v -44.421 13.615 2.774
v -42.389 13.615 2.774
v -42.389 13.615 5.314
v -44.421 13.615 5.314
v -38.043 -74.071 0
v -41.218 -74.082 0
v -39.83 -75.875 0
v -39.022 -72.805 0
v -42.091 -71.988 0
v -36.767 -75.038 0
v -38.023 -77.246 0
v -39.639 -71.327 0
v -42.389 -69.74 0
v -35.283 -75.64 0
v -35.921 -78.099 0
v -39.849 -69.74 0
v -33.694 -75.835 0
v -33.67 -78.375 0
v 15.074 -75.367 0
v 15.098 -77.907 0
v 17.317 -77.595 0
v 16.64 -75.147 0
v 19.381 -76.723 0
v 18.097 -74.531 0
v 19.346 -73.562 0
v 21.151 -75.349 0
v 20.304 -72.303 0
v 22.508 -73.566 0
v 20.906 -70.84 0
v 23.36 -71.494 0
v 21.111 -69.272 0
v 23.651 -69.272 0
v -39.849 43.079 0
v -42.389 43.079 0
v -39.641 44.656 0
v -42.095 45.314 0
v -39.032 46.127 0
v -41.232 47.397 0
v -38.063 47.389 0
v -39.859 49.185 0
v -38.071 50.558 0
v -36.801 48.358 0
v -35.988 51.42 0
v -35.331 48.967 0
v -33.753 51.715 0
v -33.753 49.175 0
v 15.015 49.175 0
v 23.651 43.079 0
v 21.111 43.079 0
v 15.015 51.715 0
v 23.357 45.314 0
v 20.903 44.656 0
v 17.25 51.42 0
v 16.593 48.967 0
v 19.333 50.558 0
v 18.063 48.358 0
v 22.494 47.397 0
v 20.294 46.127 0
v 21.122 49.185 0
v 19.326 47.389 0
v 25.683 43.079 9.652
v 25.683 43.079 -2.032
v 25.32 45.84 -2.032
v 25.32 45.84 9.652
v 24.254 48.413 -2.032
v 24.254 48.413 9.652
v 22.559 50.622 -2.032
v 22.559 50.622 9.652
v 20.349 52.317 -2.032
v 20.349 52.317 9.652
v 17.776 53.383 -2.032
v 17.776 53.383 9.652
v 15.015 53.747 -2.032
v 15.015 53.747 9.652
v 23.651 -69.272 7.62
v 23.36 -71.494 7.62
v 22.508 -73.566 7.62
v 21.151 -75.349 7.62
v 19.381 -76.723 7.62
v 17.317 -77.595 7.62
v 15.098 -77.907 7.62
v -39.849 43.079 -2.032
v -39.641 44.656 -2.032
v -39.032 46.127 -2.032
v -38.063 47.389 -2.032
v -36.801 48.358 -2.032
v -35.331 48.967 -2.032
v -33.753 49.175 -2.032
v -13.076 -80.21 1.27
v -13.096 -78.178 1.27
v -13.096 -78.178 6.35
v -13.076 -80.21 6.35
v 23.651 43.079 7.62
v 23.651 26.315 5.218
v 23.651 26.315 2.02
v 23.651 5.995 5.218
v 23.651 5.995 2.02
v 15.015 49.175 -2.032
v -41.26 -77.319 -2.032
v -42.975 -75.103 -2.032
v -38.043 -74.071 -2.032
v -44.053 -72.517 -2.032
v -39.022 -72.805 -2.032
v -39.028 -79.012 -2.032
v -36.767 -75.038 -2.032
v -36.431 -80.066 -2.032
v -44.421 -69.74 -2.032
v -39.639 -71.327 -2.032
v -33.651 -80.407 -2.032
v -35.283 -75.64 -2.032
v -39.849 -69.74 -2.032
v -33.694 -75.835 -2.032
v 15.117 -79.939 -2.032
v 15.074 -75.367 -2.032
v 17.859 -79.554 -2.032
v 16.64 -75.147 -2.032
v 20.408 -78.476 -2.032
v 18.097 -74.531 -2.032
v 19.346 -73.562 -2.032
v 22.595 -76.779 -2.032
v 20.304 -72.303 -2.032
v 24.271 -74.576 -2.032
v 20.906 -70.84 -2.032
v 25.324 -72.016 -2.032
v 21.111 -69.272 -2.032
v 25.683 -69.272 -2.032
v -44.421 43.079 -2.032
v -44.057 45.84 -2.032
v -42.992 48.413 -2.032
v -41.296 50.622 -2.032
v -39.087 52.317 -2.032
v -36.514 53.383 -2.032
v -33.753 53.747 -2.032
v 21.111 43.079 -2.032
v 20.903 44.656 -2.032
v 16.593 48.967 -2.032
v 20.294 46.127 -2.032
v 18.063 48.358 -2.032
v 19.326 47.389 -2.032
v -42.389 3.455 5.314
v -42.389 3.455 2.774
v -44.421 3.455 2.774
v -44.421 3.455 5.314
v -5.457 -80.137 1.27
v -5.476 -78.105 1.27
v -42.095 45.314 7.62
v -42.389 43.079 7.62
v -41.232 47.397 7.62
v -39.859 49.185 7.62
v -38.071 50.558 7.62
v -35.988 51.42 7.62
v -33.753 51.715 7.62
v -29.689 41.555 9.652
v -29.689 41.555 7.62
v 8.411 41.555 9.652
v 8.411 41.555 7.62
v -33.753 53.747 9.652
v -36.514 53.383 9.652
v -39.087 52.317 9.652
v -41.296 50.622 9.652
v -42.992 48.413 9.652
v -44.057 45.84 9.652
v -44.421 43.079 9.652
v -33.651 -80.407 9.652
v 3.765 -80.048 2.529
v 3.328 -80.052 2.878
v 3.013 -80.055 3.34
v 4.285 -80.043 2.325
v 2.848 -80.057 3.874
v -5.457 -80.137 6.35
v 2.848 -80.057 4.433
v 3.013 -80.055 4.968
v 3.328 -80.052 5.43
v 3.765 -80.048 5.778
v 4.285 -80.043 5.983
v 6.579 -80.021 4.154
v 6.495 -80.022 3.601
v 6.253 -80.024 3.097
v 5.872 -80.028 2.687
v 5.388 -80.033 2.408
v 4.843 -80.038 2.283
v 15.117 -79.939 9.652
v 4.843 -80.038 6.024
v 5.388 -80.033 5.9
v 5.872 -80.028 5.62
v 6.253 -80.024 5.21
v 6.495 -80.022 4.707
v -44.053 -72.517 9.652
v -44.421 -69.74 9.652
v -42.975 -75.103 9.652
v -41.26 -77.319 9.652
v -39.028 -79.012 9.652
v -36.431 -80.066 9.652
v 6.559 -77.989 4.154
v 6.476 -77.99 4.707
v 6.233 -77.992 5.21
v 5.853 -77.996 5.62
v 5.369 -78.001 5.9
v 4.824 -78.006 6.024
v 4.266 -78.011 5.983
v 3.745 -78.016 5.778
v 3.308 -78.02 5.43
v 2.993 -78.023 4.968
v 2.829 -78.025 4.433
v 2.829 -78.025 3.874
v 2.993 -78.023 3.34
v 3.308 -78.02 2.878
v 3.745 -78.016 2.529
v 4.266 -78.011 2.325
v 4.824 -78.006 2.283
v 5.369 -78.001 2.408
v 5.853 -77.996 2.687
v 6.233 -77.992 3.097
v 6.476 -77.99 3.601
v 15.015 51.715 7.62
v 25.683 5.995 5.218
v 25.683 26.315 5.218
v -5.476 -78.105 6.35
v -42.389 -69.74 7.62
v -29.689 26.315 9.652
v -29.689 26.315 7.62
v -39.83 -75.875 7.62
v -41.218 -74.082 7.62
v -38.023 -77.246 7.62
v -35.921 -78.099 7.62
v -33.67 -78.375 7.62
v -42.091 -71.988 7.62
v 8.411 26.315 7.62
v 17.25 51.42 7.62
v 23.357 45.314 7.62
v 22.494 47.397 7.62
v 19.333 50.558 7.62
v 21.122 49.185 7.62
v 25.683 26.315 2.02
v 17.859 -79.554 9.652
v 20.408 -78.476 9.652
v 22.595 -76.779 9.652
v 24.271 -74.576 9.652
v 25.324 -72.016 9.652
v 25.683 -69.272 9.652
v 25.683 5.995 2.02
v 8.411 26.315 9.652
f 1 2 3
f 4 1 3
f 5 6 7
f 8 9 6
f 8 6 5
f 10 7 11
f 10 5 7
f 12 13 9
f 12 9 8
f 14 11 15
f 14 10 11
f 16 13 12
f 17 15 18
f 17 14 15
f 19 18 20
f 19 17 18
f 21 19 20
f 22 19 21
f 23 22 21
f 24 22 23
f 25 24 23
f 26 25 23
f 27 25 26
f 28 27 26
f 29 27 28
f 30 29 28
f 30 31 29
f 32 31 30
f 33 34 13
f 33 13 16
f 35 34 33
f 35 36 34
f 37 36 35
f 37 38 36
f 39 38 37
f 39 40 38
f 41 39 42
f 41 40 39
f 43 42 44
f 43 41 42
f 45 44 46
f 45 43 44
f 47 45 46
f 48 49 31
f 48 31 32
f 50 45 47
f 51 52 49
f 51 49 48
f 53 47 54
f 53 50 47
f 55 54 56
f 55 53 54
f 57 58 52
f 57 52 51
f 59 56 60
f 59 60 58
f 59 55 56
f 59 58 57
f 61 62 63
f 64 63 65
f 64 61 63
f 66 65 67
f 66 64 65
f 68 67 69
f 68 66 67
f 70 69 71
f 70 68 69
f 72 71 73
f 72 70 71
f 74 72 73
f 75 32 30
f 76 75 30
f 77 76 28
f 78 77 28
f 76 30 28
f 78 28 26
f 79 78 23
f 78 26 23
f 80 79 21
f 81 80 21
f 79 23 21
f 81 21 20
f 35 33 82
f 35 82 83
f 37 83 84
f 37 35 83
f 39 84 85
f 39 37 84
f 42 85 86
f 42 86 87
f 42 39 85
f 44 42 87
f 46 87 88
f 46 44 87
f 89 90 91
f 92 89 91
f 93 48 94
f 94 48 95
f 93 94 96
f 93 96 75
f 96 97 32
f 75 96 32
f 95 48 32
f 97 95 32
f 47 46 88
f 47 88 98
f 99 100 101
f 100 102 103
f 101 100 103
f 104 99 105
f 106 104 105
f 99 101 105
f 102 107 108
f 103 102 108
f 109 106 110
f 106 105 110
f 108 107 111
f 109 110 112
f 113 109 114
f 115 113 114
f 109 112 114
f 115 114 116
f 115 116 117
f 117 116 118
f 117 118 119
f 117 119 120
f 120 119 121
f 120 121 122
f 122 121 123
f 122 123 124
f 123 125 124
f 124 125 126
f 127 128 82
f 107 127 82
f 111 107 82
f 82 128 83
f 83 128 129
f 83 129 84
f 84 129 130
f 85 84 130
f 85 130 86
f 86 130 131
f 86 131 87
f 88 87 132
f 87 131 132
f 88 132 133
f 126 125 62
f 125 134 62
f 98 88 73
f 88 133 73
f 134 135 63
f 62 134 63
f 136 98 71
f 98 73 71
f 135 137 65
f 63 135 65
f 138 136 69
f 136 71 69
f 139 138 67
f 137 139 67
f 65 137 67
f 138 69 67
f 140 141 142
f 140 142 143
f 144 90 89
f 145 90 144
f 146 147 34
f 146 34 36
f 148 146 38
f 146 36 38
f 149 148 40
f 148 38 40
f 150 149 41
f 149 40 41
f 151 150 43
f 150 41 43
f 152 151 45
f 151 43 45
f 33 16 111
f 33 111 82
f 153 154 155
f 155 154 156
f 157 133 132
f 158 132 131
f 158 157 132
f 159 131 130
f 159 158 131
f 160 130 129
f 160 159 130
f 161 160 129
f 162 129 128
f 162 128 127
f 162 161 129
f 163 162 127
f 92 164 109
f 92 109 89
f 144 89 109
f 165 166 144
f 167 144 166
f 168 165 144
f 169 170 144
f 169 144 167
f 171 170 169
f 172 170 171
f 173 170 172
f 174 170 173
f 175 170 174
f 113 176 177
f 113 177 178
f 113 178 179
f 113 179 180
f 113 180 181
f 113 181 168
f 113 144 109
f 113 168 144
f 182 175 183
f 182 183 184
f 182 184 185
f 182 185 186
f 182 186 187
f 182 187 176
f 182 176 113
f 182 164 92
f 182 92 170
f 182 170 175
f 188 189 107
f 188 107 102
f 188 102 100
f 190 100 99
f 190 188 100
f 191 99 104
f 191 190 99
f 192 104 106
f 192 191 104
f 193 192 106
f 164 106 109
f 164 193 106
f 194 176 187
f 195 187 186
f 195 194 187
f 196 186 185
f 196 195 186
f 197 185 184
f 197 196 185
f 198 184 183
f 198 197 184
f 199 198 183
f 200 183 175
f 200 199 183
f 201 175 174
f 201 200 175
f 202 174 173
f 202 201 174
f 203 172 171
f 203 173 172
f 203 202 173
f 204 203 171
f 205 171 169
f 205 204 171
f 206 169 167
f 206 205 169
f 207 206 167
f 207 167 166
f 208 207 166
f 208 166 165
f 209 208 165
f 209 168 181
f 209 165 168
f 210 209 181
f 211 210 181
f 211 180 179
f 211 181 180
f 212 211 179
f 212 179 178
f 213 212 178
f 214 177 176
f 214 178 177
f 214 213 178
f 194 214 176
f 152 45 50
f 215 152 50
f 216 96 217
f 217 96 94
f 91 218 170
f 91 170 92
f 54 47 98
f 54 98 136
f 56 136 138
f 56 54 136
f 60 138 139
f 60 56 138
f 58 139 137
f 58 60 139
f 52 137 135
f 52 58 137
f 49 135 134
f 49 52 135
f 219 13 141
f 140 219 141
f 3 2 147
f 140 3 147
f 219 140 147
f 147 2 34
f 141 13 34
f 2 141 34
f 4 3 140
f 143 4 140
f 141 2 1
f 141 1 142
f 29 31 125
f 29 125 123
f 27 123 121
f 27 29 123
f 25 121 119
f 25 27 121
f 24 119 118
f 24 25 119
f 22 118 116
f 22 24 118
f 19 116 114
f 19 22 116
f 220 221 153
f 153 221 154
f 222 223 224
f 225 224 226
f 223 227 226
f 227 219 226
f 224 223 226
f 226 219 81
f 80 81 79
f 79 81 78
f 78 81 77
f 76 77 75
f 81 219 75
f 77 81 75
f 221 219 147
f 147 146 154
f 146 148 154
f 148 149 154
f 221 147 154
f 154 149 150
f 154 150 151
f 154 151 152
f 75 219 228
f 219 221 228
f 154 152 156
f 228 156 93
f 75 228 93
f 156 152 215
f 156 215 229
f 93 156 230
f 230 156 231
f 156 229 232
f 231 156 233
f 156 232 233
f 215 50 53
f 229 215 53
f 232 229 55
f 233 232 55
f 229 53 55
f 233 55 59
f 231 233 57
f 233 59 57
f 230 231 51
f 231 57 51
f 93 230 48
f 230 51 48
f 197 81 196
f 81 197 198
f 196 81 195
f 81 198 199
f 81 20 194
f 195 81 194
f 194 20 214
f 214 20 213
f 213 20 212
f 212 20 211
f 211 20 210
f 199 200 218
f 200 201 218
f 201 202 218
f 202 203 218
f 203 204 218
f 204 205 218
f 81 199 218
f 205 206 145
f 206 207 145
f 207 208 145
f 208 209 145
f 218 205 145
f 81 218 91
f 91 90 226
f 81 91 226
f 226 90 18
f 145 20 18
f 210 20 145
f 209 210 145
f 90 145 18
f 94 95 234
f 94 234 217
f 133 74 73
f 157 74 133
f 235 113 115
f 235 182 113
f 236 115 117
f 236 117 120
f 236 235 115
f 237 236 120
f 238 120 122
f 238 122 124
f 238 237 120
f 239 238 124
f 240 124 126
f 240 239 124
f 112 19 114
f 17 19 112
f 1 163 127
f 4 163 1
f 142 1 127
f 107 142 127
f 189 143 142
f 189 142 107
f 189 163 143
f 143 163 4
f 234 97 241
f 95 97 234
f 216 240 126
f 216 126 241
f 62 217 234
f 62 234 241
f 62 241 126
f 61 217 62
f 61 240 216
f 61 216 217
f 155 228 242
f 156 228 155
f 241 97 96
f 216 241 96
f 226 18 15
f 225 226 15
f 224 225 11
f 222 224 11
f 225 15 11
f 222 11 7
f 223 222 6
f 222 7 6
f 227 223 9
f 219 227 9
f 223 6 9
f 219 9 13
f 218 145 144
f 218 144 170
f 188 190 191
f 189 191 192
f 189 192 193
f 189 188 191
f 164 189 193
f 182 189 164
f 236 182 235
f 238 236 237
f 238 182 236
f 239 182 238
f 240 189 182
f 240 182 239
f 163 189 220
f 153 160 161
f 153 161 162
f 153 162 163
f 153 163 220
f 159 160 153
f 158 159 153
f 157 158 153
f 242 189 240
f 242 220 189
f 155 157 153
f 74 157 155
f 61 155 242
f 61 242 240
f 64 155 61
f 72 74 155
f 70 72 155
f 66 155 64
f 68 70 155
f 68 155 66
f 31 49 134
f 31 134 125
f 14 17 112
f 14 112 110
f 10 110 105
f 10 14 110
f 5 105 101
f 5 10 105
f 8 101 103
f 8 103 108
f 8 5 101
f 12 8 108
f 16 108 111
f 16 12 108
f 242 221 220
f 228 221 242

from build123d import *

# Parameters (mm, degrees)
F0_W       = 38.1
F0_H       = 15.24
F1_DEPTH   = 7.62
F2_W       = 20.32
F2_H       = 3.1982096843
F3_DEPTH   = 25.4
F5_W       = 10.16
F5_H       = 2.54
F6_DEPTH   = 25.4
F4_W       = 3.81
F4_H       = 5.08
F4_R       = 1.8758350377
F7_DEPTH   = 25.4
F8_DEPTH   = 7.62
F1_FACE3_W = 38.1
F1_FACE3_H = 15.24
F9_DEPTH   = 2.032
F10_DEPTH  = 2.032


with BuildPart() as f1:
    # F0 (on Top) → F1 (new body)
    with BuildSketch(Plane.XY):
        with BuildLine():
            Line((15.0151342493, 51.7147295177), (-33.7528657507, 51.7147295177))
            ThreePointArc((-33.7528657507, 51.7147295177), (-39.8594399131, 49.18530368), (-42.3888657507, 43.0787295177))
            Line((-42.3888657507, 43.0787295177), (-42.3888657507, -69.7396477934))
            ThreePointArc((-42.3888657507, -69.7396477934), (-39.8300752503, -75.8754460869), (-33.6700096372, -78.3752503123))
            Line((-33.6700096372, -78.3752503123), (15.0979903628, -77.9073354291))
            ThreePointArc((15.0979903628, -77.9073354291), (21.1509325427, -75.3489424097), (23.6511342493, -69.2717329101))
            Line((23.6511342493, -69.2717329101), (23.6511342493, 43.0787295177))
            ThreePointArc((23.6511342493, 43.0787295177), (21.1217084116, 49.18530368), (15.0151342493, 51.7147295177))
        make_face()
        with BuildLine():
            ThreePointArc((-39.8488657507, 43.0787295177), (-38.0633886888, 47.3892524558), (-33.7528657507, 49.1747295177))
            Line((-33.7528657507, 49.1747295177), (15.0151342493, 49.1747295177))
            ThreePointArc((15.0151342493, 49.1747295177), (19.3256571874, 47.3892524558), (21.1111342493, 43.0787295177))
            Line((21.1111342493, 43.0787295177), (21.1111342493, -69.2717329101))
            ThreePointArc((21.1111342493, -69.2717329101), (19.3462859858, -73.561527851), (15.0736209176, -75.3674523353))
            Line((15.0736209176, -75.3674523353), (-33.6943790824, -75.8353672185))
            ThreePointArc((-33.6943790824, -75.8353672185), (-38.0426606916, -74.07079953), (-39.8488657507, -69.7396477934))
            Line((-39.8488657507, -69.7396477934), (-39.8488657507, 43.0787295177))
        make_face(mode=Mode.SUBTRACT)
        with BuildLine():
            Line((15.0151342493, 49.1747295177), (-33.7528657507, 49.1747295177))
            ThreePointArc((-33.7528657507, 49.1747295177), (-38.0633886888, 47.3892524558), (-39.8488657507, 43.0787295177))
            Line((-39.8488657507, 43.0787295177), (-39.8488657507, -69.7396477934))
            ThreePointArc((-39.8488657507, -69.7396477934), (-38.0426606916, -74.07079953), (-33.6943790824, -75.8353672185))
            Line((-33.6943790824, -75.8353672185), (15.0736209176, -75.3674523353))
            ThreePointArc((15.0736209176, -75.3674523353), (19.3462859858, -73.561527851), (21.1111342493, -69.2717329101))
            Line((21.1111342493, -69.2717329101), (21.1111342493, 43.0787295177))
            ThreePointArc((21.1111342493, 43.0787295177), (19.3256571874, 47.3892524558), (15.0151342493, 49.1747295177))
        make_face()
        with Locations((-10.6388657507, 33.9347295177)):
            Rectangle(F0_W, F0_H, mode=Mode.SUBTRACT)
    extrude(amount=F1_DEPTH)

    # F2 (on face) → F3 (join)
    with BuildSketch(Plane.YZ.offset(23.6511342493)):
        with Locations((16.1547295177, 3.6192152184)):
            Rectangle(F2_W, F2_H)
    extrude(amount=F3_DEPTH)

    # F5 (on face) → F6 (join)
    with BuildSketch(Plane(origin=(-42.3888657507, 0, 0), x_dir=(0, -1, 0), z_dir=(-1, 0, 0))):
        with Locations((-8.5347295177, 4.0440695514)):
            Rectangle(F5_W, F5_H)
    extrude(amount=F6_DEPTH)

    # F4 (on face) → F7 (join)
    with BuildSketch(Plane(origin=(0.7488193587, -78.045011583, 0), x_dir=(0.9999539739, 0.0095942697, 0), z_dir=(0.0095942697, -0.9999539739, 0))):
        with Locations((-11.9402908808, 3.81)):
            Rectangle(F4_W, F4_H)
        with Locations((-8.1302908808, 3.81)):
            Rectangle(F4_W, F4_H)
        with Locations((3.9347091192, 4.1537573561)):
            Circle(F4_R)
    extrude(amount=F7_DEPTH)


with BuildPart() as f8:
    # F0 (on Top) → F8 (new body, through all)
    with BuildSketch(Plane.XY):
        with BuildLine():
            Line((15.0151342493, 53.7467295177), (-33.7528657507, 53.7467295177))
            ThreePointArc((-33.7528657507, 53.7467295177), (-41.2962808924, 50.6221446594), (-44.4208657507, 43.0787295177))
            Line((-44.4208657507, 43.0787295177), (-44.4208657507, -69.7396477934))
            ThreePointArc((-44.4208657507, -69.7396477934), (-41.2600068973, -77.3191633324), (-33.6505140811, -80.4071567873))
            Line((-33.6505140811, -80.4071567873), (15.1174859189, -79.9392419041))
            ThreePointArc((15.1174859189, -79.9392419041), (22.5946497883, -76.7788740567), (25.6831342493, -69.2717329101))
            Line((25.6831342493, -69.2717329101), (25.6831342493, 43.0787295177))
            ThreePointArc((25.6831342493, 43.0787295177), (22.558549391, 50.6221446594), (15.0151342493, 53.7467295177))
        make_face()
        with BuildLine():
            ThreePointArc((-42.3888657507, 43.0787295177), (-39.8594399131, 49.18530368), (-33.7528657507, 51.7147295177))
            Line((-33.7528657507, 51.7147295177), (15.0151342493, 51.7147295177))
            ThreePointArc((15.0151342493, 51.7147295177), (21.1217084116, 49.18530368), (23.6511342493, 43.0787295177))
            Line((23.6511342493, 43.0787295177), (23.6511342493, -69.2717329101))
            ThreePointArc((23.6511342493, -69.2717329101), (21.1509325427, -75.3489424097), (15.0979903628, -77.9073354291))
            Line((15.0979903628, -77.9073354291), (-33.6700096372, -78.3752503123))
            ThreePointArc((-33.6700096372, -78.3752503123), (-39.8300752503, -75.8754460869), (-42.3888657507, -69.7396477934))
            Line((-42.3888657507, -69.7396477934), (-42.3888657507, 43.0787295177))
        make_face(mode=Mode.SUBTRACT)
    extrude(amount=F8_DEPTH)

    # F8_face (on face) + F1_face3 (on face) → F9 (join)
    with BuildSketch(Plane(origin=(-9.4104092831, -13.214065849, 7.62), x_dir=(1, 0, 0), z_dir=(0, 0, 1))):
        with BuildLine():
            Line((35.0935435324, -56.0576670611), (35.0935435324, 56.2927953667))
            ThreePointArc((35.0935435324, 56.2927953667), (31.9689586741, 63.8362105084), (24.4255435324, 66.9607953667))
            Line((24.4255435324, 66.9607953667), (-24.3424564676, 66.9607953667))
            ThreePointArc((-24.3424564676, 66.9607953667), (-31.8858716093, 63.8362105084), (-35.0104564676, 56.2927953667))
            Line((-35.0104564676, 56.2927953667), (-35.0104564676, -56.5255819444))
            ThreePointArc((-35.0104564676, -56.5255819444), (-31.8495976142, -64.1050974834), (-24.240104798, -67.1930909383))
            Line((-24.240104798, -67.1930909383), (24.527895202, -66.7251760551))
            ThreePointArc((24.527895202, -66.7251760551), (32.0050590714, -63.5648082077), (35.0935435324, -56.0576670611))
        make_face()
        with BuildLine():
            ThreePointArc((-32.9784564676, 56.2927953667), (-30.4490306299, 62.399369529), (-24.3424564676, 64.9287953667))
            Line((-24.3424564676, 64.9287953667), (24.4255435324, 64.9287953667))
            ThreePointArc((24.4255435324, 64.9287953667), (30.5321176947, 62.399369529), (33.0615435324, 56.2927953667))
            Line((33.0615435324, 56.2927953667), (33.0615435324, -56.0576670611))
            ThreePointArc((33.0615435324, -56.0576670611), (30.5613418259, -62.1348765607), (24.5083996459, -64.69326958))
            Line((24.5083996459, -64.69326958), (-24.2596003541, -65.1611844633))
            ThreePointArc((-24.2596003541, -65.1611844633), (-30.4196659672, -62.6613802378), (-32.9784564676, -56.5255819444))
            Line((-32.9784564676, -56.5255819444), (-32.9784564676, 56.2927953667))
        make_face(mode=Mode.SUBTRACT)
    with BuildSketch(Plane(origin=(-9.3022040754, -16.6655356146, 7.62), x_dir=(1, 0, 0), z_dir=(0, 0, 1))):
        with BuildLine():
            ThreePointArc((32.9533383247, 59.7442651323), (30.423912487, 65.8508392946), (24.3173383247, 68.3802651323))
            Line((24.3173383247, 68.3802651323), (-24.4506616753, 68.3802651323))
            ThreePointArc((-24.4506616753, 68.3802651323), (-30.5572358376, 65.8508392946), (-33.0866616753, 59.7442651323))
            Line((-33.0866616753, 59.7442651323), (-33.0866616753, -53.0741121788))
            ThreePointArc((-33.0866616753, -53.0741121788), (-30.5278711749, -59.2099104723), (-24.3678055618, -61.7097146977))
            Line((-24.3678055618, -61.7097146977), (24.4001944382, -61.2417998145))
            ThreePointArc((24.4001944382, -61.2417998145), (30.4531366182, -58.6834067951), (32.9533383247, -52.6061972956))
            Line((32.9533383247, -52.6061972956), (32.9533383247, 59.7442651323))
        make_face()
        with Locations((-1.3366616753, 50.6002651323)):
            Rectangle(F1_FACE3_W, F1_FACE3_H, mode=Mode.SUBTRACT)
    extrude(amount=F9_DEPTH)

    # F0 (on Top) → F10 (join)
    with BuildSketch(Plane.XY):
        with BuildLine():
            Line((15.0151342493, 53.7467295177), (-33.7528657507, 53.7467295177))
            ThreePointArc((-33.7528657507, 53.7467295177), (-41.2962808924, 50.6221446594), (-44.4208657507, 43.0787295177))
            Line((-44.4208657507, 43.0787295177), (-44.4208657507, -69.7396477934))
            ThreePointArc((-44.4208657507, -69.7396477934), (-41.2600068973, -77.3191633324), (-33.6505140811, -80.4071567873))
            Line((-33.6505140811, -80.4071567873), (15.1174859189, -79.9392419041))
            ThreePointArc((15.1174859189, -79.9392419041), (22.5946497883, -76.7788740567), (25.6831342493, -69.2717329101))
            Line((25.6831342493, -69.2717329101), (25.6831342493, 43.0787295177))
            ThreePointArc((25.6831342493, 43.0787295177), (22.558549391, 50.6221446594), (15.0151342493, 53.7467295177))
        make_face()
        with BuildLine():
            ThreePointArc((-42.3888657507, 43.0787295177), (-39.8594399131, 49.18530368), (-33.7528657507, 51.7147295177))
            Line((-33.7528657507, 51.7147295177), (15.0151342493, 51.7147295177))
            ThreePointArc((15.0151342493, 51.7147295177), (21.1217084116, 49.18530368), (23.6511342493, 43.0787295177))
            Line((23.6511342493, 43.0787295177), (23.6511342493, -69.2717329101))
            ThreePointArc((23.6511342493, -69.2717329101), (21.1509325427, -75.3489424097), (15.0979903628, -77.9073354291))
            Line((15.0979903628, -77.9073354291), (-33.6700096372, -78.3752503123))
            ThreePointArc((-33.6700096372, -78.3752503123), (-39.8300752503, -75.8754460869), (-42.3888657507, -69.7396477934))
            Line((-42.3888657507, -69.7396477934), (-42.3888657507, 43.0787295177))
        make_face(mode=Mode.SUBTRACT)
        with BuildLine():
            Line((15.0151342493, 51.7147295177), (-33.7528657507, 51.7147295177))
            ThreePointArc((-33.7528657507, 51.7147295177), (-39.8594399131, 49.18530368), (-42.3888657507, 43.0787295177))
            Line((-42.3888657507, 43.0787295177), (-42.3888657507, -69.7396477934))
            ThreePointArc((-42.3888657507, -69.7396477934), (-39.8300752503, -75.8754460869), (-33.6700096372, -78.3752503123))
            Line((-33.6700096372, -78.3752503123), (15.0979903628, -77.9073354291))
            ThreePointArc((15.0979903628, -77.9073354291), (21.1509325427, -75.3489424097), (23.6511342493, -69.2717329101))
            Line((23.6511342493, -69.2717329101), (23.6511342493, 43.0787295177))
            ThreePointArc((23.6511342493, 43.0787295177), (21.1217084116, 49.18530368), (15.0151342493, 51.7147295177))
        make_face()
        with BuildLine():
            ThreePointArc((-39.8488657507, 43.0787295177), (-38.0633886888, 47.3892524558), (-33.7528657507, 49.1747295177))
            Line((-33.7528657507, 49.1747295177), (15.0151342493, 49.1747295177))
            ThreePointArc((15.0151342493, 49.1747295177), (19.3256571874, 47.3892524558), (21.1111342493, 43.0787295177))
            Line((21.1111342493, 43.0787295177), (21.1111342493, -69.2717329101))
            ThreePointArc((21.1111342493, -69.2717329101), (19.3462859858, -73.561527851), (15.0736209176, -75.3674523353))
            Line((15.0736209176, -75.3674523353), (-33.6943790824, -75.8353672185))
            ThreePointArc((-33.6943790824, -75.8353672185), (-38.0426606916, -74.07079953), (-39.8488657507, -69.7396477934))
            Line((-39.8488657507, -69.7396477934), (-39.8488657507, 43.0787295177))
        make_face(mode=Mode.SUBTRACT)
    extrude(amount=-F10_DEPTH)

    # F11: cut F1
    add(f1.part, mode=Mode.SUBTRACT)


solid = f8.part
